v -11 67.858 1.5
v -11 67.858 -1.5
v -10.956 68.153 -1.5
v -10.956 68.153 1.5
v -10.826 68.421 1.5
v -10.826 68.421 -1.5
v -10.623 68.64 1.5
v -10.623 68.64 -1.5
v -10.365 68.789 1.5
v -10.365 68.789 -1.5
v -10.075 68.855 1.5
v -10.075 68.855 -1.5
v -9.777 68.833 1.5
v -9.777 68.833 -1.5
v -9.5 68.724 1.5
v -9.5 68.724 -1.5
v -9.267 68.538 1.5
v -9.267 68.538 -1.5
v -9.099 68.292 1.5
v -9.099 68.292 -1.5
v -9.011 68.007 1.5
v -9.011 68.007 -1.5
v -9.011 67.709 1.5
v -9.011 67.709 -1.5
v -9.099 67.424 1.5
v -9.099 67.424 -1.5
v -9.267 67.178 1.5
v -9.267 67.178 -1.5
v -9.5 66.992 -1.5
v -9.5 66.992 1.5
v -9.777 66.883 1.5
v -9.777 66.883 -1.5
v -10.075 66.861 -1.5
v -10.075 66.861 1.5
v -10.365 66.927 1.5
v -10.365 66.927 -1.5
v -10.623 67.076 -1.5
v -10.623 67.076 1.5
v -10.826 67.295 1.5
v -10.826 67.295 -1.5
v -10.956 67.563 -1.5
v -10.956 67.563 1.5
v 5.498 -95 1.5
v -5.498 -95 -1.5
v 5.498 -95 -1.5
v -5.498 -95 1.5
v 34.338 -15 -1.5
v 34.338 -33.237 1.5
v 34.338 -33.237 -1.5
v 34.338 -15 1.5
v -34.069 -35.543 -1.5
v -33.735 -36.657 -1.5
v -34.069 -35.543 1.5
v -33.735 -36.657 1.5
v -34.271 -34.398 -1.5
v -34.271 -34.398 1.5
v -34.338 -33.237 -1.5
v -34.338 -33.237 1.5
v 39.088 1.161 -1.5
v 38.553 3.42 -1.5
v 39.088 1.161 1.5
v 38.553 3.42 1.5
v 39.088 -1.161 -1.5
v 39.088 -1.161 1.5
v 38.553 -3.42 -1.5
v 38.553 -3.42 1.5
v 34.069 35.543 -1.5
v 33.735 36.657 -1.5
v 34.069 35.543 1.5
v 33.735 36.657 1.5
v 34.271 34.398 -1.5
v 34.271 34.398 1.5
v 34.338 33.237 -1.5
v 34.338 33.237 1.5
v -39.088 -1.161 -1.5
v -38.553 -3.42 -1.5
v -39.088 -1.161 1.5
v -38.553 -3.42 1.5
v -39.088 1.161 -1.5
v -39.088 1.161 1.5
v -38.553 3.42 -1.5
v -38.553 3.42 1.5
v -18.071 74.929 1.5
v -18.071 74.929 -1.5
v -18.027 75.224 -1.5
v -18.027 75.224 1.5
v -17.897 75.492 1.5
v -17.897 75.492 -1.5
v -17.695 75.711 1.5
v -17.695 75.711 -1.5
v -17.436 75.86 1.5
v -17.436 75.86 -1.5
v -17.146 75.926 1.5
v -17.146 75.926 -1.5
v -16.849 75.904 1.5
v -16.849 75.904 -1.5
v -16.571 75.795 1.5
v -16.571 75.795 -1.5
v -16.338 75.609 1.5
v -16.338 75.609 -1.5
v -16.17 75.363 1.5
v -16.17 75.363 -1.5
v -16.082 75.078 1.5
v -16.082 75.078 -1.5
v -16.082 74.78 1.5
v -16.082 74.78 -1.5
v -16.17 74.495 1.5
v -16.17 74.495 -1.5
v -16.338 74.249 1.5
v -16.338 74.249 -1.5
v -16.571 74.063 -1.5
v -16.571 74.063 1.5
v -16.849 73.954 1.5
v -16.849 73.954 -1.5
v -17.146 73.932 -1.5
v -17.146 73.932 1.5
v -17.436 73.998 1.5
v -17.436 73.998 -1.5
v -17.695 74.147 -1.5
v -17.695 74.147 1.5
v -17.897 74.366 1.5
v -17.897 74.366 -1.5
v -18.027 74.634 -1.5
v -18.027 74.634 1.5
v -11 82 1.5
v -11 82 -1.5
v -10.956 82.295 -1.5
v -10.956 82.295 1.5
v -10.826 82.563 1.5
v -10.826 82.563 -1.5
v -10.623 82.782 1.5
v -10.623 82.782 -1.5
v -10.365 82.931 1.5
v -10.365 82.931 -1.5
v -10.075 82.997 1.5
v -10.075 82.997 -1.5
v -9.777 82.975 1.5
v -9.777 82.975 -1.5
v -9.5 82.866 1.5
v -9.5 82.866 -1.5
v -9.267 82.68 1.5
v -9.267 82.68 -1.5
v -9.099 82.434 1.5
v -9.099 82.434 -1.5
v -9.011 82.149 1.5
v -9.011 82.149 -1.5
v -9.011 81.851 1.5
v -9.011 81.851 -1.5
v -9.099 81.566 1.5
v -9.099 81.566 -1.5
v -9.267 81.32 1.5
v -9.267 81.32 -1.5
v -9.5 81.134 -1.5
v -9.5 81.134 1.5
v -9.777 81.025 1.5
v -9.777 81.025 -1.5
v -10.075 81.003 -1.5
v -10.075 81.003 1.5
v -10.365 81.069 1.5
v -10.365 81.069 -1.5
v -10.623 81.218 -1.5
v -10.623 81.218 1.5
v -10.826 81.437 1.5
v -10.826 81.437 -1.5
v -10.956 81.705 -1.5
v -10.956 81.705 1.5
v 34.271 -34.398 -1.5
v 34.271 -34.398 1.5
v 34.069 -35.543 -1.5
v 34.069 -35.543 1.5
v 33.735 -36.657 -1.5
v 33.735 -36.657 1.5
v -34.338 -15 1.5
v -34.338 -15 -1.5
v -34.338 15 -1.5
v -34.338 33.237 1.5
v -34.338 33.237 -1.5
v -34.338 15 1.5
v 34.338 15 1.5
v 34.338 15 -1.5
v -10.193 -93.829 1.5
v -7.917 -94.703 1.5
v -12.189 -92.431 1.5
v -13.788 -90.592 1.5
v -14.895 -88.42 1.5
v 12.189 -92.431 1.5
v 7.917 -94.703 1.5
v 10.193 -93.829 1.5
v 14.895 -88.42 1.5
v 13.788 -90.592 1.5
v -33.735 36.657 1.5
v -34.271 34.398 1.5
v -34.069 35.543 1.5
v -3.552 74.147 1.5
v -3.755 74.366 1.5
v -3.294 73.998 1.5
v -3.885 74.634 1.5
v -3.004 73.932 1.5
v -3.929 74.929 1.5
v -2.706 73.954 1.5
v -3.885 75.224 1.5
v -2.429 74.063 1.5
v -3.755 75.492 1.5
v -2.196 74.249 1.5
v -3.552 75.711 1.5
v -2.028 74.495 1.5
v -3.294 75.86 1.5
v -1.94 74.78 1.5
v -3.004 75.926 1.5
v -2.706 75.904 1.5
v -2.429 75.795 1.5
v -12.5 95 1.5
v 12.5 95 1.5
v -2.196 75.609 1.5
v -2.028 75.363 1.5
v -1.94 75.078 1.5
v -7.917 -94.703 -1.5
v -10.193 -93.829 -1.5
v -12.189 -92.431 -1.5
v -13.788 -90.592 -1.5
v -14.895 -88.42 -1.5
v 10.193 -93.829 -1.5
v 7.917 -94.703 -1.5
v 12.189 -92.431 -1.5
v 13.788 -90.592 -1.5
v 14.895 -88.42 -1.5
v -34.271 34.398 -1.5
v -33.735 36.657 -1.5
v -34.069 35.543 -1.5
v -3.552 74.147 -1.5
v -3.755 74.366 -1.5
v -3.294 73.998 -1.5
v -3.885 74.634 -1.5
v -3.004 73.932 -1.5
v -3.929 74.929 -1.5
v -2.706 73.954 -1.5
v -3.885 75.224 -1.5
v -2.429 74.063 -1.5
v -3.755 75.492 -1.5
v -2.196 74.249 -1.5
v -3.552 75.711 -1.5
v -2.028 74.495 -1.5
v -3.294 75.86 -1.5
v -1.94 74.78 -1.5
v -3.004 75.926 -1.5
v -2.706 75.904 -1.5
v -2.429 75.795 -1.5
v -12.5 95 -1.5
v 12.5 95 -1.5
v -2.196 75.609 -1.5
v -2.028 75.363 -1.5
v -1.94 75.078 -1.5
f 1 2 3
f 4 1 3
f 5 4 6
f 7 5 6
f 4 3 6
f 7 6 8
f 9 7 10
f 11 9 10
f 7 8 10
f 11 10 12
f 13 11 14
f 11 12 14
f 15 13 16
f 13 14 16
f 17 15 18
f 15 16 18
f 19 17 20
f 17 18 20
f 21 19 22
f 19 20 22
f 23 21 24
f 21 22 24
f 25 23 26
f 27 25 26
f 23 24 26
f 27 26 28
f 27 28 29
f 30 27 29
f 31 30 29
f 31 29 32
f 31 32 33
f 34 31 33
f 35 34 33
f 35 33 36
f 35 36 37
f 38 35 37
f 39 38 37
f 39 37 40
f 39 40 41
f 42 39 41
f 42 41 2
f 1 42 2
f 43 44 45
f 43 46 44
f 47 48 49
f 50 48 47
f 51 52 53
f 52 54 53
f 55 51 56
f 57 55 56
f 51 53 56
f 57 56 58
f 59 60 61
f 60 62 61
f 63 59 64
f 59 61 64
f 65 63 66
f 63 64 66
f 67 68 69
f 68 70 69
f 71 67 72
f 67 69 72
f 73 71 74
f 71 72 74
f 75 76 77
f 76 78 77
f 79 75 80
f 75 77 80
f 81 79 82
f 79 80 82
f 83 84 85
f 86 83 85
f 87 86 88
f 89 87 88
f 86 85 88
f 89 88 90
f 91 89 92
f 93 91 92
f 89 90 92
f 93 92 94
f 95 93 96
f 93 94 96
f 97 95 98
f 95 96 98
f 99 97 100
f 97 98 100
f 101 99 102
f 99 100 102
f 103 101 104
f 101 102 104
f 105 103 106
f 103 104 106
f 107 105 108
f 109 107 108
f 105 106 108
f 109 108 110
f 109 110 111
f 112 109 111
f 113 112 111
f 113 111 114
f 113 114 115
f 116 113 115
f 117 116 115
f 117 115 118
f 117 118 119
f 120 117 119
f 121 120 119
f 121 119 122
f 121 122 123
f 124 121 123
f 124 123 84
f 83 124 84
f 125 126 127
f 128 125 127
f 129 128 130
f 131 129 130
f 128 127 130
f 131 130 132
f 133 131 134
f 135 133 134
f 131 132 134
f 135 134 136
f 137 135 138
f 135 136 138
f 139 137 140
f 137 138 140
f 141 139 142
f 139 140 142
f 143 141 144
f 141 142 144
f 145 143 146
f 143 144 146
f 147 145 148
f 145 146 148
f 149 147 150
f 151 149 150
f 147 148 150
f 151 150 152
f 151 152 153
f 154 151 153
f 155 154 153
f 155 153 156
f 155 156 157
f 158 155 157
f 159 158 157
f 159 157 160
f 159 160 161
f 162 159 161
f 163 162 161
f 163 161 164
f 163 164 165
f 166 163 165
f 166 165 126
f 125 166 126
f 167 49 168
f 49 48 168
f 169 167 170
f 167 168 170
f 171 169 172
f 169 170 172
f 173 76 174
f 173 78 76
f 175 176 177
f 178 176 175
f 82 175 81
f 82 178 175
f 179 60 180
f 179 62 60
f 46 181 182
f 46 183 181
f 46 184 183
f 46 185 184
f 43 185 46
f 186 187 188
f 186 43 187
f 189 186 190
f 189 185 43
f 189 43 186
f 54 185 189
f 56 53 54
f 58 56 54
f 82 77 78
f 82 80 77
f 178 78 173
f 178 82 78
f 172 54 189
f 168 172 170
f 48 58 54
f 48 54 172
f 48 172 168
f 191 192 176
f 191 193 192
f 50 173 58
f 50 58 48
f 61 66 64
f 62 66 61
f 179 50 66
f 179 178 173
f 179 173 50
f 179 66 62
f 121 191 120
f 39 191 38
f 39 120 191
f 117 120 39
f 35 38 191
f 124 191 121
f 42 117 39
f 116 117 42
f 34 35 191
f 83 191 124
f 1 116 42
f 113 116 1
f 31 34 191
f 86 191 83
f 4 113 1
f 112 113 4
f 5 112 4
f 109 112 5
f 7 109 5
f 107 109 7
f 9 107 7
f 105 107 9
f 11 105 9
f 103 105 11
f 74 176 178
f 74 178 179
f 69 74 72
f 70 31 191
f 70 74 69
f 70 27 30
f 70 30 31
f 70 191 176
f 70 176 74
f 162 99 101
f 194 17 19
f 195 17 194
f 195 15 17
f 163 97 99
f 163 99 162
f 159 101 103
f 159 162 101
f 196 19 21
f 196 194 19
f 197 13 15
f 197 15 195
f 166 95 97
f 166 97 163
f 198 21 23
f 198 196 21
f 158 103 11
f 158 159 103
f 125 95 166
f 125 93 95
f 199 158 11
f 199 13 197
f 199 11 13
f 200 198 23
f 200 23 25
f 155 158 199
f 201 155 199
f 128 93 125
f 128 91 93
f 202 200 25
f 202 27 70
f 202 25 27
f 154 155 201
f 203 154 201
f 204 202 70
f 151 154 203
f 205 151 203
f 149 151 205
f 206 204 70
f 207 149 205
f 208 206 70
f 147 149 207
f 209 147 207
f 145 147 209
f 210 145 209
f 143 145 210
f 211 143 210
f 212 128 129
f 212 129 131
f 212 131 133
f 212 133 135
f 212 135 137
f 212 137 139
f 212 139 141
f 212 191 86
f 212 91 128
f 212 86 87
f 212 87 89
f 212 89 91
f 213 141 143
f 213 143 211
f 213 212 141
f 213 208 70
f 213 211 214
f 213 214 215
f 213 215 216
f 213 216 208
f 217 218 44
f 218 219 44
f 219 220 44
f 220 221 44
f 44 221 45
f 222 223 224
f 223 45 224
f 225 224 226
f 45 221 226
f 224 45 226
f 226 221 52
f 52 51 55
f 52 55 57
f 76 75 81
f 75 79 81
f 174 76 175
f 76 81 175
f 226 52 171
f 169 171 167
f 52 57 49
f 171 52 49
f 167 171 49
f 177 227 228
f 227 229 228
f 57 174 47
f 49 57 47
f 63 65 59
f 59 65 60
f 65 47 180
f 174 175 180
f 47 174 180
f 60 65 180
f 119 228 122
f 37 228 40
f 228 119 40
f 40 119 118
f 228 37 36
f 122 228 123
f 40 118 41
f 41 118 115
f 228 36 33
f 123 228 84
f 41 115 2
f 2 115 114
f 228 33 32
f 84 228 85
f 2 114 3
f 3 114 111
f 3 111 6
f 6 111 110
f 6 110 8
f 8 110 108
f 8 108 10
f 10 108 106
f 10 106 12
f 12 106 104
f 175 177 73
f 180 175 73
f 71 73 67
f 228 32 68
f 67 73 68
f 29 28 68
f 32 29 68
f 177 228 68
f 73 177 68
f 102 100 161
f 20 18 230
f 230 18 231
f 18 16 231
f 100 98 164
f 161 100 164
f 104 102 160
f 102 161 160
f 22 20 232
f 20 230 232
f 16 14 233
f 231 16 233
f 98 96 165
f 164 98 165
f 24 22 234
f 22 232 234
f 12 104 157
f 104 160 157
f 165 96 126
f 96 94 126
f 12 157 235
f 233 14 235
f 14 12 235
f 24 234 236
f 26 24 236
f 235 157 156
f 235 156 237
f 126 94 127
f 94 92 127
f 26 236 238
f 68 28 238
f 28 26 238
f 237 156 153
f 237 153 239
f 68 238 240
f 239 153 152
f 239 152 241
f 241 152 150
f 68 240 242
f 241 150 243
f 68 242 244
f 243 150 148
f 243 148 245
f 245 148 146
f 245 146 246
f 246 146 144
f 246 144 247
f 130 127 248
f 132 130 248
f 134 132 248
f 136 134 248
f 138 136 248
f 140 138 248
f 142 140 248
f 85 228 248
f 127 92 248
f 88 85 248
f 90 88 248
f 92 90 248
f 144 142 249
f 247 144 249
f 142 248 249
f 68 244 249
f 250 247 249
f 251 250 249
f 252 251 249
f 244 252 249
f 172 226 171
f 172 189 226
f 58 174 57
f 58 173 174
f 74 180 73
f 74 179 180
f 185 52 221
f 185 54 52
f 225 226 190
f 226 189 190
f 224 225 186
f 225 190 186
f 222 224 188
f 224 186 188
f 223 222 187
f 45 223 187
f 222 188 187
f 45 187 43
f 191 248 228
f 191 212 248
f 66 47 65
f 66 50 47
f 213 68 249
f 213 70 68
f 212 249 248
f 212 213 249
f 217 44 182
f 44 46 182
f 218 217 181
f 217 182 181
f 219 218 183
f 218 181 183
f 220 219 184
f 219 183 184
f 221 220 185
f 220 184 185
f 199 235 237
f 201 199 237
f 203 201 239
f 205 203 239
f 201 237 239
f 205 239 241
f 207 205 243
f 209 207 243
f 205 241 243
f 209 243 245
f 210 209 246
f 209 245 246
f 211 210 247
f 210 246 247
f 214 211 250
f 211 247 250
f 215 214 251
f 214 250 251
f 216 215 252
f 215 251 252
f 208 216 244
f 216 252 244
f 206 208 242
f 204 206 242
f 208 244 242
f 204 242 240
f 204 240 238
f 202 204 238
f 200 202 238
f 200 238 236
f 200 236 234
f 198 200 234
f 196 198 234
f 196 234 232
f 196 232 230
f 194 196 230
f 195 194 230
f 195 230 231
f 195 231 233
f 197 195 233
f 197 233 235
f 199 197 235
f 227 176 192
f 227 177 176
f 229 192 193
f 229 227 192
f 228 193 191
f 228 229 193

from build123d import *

# Parameters (mm, degrees)
F1_DEPTH = 1.5
F2_R     = 10
F4_D     = 2


with BuildPart() as f1:
    # F0 (on Top) → F1 (new body, symmetric)
    with BuildSketch(Plane.XY):
        Polygon((-34.338214056, 35), (-34.338214056, 15), (-39.79776757, 0), (-34.338214056, -15), (-34.338214056, -35), (-12.5, -95), (0, -95), (12.5, -95), (34.338214056, -35), (34.338214056, -15), (39.79776757, 0), (34.338214056, 15), (34.338214056, 35), (12.5, 95), (0, 95), (-12.5, 95), align=None)
    extrude(amount=F1_DEPTH, both=True)

    # F2
    f2_edges = [f1.edges().sort_by_distance(p)[0] for p in [
        (-34.338214, 35, 0),
        (-39.797768, 0, 0),
        (34.338214, 35, 0),
        (39.797768, 0, 0),
        (-34.338214, -35, 0),
        (34.338214, -35, 0),
        (12.5, -95, 0),
        (-12.5, -95, 0),
    ]]
    fillet(f2_edges, radius=F2_R)

    # F4 (through all)
    with Locations(Plane.XY.offset(1.5)):
        with Locations((-17.0710678119, 74.9289321881), (-10, 82), (-10, 67.8578643763), (-2.9289321881, 74.9289321881)):
            Hole(F4_D / 2)


solid = f1.part
